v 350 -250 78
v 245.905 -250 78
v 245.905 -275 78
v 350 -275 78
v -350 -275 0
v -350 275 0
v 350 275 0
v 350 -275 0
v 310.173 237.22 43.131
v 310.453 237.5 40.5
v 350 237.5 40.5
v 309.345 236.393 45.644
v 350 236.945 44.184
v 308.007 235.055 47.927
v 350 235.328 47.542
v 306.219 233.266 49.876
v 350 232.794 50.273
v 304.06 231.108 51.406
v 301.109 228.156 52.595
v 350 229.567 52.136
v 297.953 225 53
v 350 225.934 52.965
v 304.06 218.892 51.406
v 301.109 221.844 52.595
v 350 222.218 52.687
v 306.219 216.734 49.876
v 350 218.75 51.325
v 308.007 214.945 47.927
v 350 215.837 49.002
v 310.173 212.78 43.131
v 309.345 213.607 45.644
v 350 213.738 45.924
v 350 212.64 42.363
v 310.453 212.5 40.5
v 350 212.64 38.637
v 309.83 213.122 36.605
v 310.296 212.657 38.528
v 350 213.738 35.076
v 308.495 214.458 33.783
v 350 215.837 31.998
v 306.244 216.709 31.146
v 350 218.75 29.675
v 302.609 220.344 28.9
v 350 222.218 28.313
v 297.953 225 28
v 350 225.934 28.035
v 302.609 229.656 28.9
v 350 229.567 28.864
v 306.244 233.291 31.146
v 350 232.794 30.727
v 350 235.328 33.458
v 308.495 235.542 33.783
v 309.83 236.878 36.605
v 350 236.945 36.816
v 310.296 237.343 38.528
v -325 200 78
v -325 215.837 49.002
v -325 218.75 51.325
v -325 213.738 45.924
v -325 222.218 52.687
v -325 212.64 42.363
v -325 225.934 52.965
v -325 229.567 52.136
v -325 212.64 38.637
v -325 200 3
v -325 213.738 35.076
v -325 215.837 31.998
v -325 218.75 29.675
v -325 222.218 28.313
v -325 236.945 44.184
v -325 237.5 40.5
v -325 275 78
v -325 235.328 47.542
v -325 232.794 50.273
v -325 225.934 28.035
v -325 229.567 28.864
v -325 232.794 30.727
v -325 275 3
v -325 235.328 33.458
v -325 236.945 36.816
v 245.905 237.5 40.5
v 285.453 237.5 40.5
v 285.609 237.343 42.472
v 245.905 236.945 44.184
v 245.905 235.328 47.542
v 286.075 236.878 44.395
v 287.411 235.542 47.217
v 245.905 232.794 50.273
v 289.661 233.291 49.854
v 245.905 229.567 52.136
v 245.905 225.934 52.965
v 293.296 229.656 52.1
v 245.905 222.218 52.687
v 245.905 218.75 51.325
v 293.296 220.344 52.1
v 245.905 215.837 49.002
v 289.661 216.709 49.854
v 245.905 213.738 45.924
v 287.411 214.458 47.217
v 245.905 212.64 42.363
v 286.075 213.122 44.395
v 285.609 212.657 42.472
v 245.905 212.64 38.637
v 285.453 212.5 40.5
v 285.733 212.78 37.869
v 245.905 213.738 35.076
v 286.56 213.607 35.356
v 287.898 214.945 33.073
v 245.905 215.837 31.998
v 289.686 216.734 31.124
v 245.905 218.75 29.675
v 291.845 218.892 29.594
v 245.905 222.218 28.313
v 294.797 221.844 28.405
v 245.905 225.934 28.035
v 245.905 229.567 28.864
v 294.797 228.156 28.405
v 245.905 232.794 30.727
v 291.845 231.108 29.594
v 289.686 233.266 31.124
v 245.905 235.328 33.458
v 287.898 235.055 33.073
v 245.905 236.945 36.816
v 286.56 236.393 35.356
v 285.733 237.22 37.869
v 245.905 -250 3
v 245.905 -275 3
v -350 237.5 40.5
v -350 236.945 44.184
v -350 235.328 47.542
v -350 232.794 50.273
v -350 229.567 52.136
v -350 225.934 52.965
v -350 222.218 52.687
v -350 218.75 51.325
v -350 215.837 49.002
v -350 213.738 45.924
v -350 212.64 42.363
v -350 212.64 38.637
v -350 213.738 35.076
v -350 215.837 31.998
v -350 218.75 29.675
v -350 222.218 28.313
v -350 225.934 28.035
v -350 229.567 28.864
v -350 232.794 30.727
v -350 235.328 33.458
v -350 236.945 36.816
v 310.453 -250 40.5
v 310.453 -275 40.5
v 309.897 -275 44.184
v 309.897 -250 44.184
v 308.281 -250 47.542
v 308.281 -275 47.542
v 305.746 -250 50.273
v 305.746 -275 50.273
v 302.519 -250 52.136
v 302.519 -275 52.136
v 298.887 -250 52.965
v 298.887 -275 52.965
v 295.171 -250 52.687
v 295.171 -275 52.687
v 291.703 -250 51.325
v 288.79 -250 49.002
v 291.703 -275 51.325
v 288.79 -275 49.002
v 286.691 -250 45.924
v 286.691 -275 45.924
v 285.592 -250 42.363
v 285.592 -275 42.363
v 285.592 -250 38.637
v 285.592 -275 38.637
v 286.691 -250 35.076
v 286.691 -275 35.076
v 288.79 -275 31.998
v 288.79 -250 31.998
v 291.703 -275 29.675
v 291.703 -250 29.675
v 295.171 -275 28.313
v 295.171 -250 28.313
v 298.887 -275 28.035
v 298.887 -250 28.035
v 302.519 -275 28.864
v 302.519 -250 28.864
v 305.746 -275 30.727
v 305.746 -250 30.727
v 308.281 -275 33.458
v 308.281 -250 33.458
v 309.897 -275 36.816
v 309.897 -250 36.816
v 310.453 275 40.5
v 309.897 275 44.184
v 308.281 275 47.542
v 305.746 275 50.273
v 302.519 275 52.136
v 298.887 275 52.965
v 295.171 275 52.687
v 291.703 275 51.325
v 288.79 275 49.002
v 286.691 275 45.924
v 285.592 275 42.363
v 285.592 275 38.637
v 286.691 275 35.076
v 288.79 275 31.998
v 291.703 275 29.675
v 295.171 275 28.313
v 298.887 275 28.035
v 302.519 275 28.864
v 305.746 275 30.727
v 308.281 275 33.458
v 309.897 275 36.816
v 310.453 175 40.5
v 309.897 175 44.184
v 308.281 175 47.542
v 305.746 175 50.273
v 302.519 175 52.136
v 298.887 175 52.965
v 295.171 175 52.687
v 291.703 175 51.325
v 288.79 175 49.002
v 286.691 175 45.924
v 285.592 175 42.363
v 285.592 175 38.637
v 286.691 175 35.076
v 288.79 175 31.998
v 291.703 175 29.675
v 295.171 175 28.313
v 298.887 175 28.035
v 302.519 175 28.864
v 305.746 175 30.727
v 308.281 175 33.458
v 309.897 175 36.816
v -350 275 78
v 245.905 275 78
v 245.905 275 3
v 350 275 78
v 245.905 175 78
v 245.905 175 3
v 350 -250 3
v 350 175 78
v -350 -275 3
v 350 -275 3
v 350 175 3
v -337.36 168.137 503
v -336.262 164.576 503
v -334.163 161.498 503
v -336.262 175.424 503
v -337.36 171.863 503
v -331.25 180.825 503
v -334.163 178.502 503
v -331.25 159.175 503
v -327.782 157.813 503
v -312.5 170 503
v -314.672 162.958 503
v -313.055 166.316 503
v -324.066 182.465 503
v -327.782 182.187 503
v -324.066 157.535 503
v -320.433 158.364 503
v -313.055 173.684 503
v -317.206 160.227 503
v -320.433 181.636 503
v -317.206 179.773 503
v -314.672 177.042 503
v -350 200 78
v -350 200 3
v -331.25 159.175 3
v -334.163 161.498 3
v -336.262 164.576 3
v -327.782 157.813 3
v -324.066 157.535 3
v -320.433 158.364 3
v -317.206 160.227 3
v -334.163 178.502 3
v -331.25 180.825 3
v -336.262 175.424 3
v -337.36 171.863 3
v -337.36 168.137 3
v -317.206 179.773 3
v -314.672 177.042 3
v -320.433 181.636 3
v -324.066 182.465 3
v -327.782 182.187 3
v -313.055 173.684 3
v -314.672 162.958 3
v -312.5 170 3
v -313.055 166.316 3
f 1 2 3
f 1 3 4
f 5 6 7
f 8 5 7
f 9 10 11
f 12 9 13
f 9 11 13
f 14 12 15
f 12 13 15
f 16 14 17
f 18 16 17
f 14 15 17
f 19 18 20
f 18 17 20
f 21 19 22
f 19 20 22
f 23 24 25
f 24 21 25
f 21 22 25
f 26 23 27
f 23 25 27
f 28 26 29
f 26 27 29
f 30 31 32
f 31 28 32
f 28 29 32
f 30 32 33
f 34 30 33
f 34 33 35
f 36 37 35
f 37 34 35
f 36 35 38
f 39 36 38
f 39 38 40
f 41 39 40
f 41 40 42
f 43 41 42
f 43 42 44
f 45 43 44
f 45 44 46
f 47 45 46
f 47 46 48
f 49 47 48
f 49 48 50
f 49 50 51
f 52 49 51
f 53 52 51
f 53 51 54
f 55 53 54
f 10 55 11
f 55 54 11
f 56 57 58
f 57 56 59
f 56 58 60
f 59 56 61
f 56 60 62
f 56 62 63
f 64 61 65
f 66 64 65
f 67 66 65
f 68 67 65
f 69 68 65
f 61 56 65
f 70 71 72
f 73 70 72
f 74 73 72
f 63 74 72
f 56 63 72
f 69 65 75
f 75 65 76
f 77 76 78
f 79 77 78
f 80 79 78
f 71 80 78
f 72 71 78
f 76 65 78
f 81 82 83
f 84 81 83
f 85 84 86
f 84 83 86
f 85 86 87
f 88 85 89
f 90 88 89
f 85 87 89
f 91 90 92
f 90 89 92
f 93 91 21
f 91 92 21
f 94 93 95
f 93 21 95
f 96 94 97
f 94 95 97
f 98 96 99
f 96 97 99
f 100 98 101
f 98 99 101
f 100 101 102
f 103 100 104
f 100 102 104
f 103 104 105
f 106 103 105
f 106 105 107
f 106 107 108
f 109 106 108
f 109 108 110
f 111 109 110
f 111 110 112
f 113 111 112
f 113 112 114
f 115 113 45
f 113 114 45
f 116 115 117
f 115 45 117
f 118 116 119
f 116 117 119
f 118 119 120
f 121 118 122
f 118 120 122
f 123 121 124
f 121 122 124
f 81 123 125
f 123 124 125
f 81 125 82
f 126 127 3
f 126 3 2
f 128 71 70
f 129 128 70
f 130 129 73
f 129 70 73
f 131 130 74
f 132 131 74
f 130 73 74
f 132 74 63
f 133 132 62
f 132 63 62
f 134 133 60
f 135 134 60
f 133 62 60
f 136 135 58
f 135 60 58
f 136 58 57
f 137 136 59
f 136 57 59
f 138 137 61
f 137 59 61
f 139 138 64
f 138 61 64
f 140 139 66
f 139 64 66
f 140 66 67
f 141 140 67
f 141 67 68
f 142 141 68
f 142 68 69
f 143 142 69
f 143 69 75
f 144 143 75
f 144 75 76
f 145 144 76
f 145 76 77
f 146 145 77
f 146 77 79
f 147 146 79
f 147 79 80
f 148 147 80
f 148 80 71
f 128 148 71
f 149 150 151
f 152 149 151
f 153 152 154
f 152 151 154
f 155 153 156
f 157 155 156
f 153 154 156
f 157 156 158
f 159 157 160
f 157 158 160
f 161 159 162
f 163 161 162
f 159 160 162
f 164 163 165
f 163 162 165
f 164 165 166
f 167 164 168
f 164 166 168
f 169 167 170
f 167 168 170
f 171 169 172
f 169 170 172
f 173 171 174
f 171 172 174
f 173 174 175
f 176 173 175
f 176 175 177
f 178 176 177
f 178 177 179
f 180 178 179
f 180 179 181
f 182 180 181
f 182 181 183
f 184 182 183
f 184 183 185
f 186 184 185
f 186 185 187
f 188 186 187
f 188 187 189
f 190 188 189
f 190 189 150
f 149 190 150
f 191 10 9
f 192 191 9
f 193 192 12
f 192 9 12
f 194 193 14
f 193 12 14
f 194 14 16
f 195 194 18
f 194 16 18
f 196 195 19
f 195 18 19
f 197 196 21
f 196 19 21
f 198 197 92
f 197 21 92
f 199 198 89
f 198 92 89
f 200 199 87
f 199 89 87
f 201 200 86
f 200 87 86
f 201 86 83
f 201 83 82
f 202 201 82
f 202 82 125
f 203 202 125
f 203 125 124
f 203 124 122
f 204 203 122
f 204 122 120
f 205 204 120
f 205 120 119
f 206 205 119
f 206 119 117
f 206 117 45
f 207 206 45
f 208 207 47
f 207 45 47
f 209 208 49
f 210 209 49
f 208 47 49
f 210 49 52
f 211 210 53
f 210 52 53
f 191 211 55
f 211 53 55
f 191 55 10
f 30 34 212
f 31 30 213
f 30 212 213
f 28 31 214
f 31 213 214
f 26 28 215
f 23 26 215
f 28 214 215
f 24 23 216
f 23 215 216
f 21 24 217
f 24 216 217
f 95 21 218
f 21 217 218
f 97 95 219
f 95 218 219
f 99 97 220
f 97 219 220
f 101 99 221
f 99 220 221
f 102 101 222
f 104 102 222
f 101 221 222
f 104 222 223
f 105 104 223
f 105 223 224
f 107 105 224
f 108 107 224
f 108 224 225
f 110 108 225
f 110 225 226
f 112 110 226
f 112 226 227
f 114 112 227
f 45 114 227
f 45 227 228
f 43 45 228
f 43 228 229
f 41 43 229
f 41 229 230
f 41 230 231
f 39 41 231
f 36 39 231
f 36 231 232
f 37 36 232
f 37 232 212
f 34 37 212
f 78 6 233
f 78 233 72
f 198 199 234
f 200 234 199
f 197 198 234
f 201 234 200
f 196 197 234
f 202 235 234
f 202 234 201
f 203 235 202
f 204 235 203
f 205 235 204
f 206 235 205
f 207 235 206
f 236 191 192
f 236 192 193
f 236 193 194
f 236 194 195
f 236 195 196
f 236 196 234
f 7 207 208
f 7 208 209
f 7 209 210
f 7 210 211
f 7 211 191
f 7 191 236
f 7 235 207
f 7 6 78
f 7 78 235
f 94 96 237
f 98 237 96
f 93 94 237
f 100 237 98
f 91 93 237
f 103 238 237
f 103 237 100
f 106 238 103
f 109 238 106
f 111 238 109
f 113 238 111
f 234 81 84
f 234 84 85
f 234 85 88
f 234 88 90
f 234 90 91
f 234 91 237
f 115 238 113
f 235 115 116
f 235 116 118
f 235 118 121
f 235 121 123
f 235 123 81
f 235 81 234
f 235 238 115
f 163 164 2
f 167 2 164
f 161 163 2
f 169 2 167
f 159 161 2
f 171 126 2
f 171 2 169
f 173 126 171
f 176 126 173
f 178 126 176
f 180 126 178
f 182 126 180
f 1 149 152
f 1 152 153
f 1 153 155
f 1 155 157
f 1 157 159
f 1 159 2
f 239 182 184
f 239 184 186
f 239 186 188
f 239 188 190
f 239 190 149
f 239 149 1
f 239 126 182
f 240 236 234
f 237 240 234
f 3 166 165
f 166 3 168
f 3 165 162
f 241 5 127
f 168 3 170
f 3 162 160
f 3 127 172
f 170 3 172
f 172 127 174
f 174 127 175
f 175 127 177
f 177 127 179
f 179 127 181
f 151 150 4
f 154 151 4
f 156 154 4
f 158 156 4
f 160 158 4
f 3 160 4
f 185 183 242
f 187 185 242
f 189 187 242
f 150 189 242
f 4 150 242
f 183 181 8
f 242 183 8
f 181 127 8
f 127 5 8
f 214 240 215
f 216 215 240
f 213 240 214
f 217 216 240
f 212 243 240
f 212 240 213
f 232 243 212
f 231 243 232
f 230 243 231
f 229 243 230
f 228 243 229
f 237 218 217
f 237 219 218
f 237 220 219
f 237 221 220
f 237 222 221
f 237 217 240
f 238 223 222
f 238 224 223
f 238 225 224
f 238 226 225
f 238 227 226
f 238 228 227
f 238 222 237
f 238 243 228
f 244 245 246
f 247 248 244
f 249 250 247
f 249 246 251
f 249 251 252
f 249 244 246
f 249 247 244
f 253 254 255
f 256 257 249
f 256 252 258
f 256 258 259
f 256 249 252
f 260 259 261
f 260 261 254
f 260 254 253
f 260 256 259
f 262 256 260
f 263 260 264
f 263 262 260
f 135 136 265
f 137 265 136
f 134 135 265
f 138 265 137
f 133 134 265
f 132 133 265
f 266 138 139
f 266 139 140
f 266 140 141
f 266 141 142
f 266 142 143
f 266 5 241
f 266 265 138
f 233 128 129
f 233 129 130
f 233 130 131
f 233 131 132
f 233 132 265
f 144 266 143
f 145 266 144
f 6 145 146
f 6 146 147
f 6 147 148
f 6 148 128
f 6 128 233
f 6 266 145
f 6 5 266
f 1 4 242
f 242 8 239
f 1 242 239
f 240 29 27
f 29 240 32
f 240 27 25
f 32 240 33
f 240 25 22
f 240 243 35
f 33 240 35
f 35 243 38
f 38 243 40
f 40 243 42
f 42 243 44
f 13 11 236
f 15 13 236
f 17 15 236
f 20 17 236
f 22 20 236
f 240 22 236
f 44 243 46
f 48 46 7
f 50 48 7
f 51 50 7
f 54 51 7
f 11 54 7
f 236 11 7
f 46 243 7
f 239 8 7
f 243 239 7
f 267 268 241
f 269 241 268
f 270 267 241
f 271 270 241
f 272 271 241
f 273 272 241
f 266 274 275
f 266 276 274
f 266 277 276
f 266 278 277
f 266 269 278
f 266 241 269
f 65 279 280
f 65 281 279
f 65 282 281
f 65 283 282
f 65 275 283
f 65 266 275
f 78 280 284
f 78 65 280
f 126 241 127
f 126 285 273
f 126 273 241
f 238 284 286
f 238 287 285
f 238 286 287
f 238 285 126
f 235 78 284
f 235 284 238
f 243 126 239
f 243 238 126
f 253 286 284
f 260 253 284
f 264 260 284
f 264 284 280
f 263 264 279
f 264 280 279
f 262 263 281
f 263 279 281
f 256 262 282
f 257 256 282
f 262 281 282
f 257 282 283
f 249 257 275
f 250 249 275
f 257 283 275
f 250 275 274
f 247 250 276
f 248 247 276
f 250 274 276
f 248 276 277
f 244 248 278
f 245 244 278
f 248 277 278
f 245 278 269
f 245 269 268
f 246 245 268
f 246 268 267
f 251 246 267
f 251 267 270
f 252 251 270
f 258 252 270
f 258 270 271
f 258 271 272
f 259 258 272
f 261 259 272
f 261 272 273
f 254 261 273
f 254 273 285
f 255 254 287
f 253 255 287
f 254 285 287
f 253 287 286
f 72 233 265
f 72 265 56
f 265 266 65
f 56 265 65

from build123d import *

# Parameters (mm, degrees)
CROQUIS1_W              = 700
CROQUIS1_H              = 550
SALIENTE_EXTRUIR1_DEPTH = 3
CROQUIS2_W              = 25
CROQUIS2_H              = 75
CROQUIS2_W_2            = 104.094566175
CROQUIS2_H_2            = 25
SALIENTE_EXTRUIR2_DEPTH = 75
CROQUIS4_R              = 12.5
CORTAR_EXTRUIR1_DEPTH   = 570
CROQUIS5_R              = 12.5
CORTAR_EXTRUIR2_DEPTH   = 740
CROQUIS7_R              = 12.5
SALIENTE_EXTRUIR4_DEPTH = 500


with BuildPart() as part:
    # Croquis1 → Saliente-Extruir1 (new body)
    with BuildSketch(Plane.XY):
        Rectangle(CROQUIS1_W, CROQUIS1_H)
    extrude(amount=SALIENTE_EXTRUIR1_DEPTH)

    # Croquis2 → Saliente-Extruir2 (add)
    with BuildSketch(Plane.XY.offset(3)):
        Polygon((350, 275), (350, 200), (350, 175), (245.905433825, 175), (245.905433825, 275), align=None)
        with Locations((-337.5, 237.5)):
            Rectangle(CROQUIS2_W, CROQUIS2_H)
        with Locations((297.952716913, -262.5)):
            Rectangle(CROQUIS2_W_2, CROQUIS2_H_2)
    extrude(amount=SALIENTE_EXTRUIR2_DEPTH)

    # Croquis4 → Cortar-Extruir1 (cut)
    with BuildSketch(Plane.XZ.offset(275)):
        with Locations((297.952716912, 40.5)):
            Circle(CROQUIS4_R)
    extrude(amount=-CORTAR_EXTRUIR1_DEPTH, mode=Mode.SUBTRACT)

    # Croquis5 → Cortar-Extruir2 (cut)
    with BuildSketch(Plane(origin=(350, 0, 0), x_dir=(0, 0, -1), z_dir=(1, 0, 0))):
        with Locations(Location((-40.5, 225, 0), (0, 0, 90))):
            Circle(CROQUIS5_R)
    extrude(amount=-CORTAR_EXTRUIR2_DEPTH, mode=Mode.SUBTRACT)

    # Croquis7 → Saliente-Extruir4 (add)
    with BuildSketch(Plane.XY.offset(3)):
        with Locations((-325, 170)):
            Circle(CROQUIS7_R)
    extrude(amount=SALIENTE_EXTRUIR4_DEPTH)


solid = part.part
